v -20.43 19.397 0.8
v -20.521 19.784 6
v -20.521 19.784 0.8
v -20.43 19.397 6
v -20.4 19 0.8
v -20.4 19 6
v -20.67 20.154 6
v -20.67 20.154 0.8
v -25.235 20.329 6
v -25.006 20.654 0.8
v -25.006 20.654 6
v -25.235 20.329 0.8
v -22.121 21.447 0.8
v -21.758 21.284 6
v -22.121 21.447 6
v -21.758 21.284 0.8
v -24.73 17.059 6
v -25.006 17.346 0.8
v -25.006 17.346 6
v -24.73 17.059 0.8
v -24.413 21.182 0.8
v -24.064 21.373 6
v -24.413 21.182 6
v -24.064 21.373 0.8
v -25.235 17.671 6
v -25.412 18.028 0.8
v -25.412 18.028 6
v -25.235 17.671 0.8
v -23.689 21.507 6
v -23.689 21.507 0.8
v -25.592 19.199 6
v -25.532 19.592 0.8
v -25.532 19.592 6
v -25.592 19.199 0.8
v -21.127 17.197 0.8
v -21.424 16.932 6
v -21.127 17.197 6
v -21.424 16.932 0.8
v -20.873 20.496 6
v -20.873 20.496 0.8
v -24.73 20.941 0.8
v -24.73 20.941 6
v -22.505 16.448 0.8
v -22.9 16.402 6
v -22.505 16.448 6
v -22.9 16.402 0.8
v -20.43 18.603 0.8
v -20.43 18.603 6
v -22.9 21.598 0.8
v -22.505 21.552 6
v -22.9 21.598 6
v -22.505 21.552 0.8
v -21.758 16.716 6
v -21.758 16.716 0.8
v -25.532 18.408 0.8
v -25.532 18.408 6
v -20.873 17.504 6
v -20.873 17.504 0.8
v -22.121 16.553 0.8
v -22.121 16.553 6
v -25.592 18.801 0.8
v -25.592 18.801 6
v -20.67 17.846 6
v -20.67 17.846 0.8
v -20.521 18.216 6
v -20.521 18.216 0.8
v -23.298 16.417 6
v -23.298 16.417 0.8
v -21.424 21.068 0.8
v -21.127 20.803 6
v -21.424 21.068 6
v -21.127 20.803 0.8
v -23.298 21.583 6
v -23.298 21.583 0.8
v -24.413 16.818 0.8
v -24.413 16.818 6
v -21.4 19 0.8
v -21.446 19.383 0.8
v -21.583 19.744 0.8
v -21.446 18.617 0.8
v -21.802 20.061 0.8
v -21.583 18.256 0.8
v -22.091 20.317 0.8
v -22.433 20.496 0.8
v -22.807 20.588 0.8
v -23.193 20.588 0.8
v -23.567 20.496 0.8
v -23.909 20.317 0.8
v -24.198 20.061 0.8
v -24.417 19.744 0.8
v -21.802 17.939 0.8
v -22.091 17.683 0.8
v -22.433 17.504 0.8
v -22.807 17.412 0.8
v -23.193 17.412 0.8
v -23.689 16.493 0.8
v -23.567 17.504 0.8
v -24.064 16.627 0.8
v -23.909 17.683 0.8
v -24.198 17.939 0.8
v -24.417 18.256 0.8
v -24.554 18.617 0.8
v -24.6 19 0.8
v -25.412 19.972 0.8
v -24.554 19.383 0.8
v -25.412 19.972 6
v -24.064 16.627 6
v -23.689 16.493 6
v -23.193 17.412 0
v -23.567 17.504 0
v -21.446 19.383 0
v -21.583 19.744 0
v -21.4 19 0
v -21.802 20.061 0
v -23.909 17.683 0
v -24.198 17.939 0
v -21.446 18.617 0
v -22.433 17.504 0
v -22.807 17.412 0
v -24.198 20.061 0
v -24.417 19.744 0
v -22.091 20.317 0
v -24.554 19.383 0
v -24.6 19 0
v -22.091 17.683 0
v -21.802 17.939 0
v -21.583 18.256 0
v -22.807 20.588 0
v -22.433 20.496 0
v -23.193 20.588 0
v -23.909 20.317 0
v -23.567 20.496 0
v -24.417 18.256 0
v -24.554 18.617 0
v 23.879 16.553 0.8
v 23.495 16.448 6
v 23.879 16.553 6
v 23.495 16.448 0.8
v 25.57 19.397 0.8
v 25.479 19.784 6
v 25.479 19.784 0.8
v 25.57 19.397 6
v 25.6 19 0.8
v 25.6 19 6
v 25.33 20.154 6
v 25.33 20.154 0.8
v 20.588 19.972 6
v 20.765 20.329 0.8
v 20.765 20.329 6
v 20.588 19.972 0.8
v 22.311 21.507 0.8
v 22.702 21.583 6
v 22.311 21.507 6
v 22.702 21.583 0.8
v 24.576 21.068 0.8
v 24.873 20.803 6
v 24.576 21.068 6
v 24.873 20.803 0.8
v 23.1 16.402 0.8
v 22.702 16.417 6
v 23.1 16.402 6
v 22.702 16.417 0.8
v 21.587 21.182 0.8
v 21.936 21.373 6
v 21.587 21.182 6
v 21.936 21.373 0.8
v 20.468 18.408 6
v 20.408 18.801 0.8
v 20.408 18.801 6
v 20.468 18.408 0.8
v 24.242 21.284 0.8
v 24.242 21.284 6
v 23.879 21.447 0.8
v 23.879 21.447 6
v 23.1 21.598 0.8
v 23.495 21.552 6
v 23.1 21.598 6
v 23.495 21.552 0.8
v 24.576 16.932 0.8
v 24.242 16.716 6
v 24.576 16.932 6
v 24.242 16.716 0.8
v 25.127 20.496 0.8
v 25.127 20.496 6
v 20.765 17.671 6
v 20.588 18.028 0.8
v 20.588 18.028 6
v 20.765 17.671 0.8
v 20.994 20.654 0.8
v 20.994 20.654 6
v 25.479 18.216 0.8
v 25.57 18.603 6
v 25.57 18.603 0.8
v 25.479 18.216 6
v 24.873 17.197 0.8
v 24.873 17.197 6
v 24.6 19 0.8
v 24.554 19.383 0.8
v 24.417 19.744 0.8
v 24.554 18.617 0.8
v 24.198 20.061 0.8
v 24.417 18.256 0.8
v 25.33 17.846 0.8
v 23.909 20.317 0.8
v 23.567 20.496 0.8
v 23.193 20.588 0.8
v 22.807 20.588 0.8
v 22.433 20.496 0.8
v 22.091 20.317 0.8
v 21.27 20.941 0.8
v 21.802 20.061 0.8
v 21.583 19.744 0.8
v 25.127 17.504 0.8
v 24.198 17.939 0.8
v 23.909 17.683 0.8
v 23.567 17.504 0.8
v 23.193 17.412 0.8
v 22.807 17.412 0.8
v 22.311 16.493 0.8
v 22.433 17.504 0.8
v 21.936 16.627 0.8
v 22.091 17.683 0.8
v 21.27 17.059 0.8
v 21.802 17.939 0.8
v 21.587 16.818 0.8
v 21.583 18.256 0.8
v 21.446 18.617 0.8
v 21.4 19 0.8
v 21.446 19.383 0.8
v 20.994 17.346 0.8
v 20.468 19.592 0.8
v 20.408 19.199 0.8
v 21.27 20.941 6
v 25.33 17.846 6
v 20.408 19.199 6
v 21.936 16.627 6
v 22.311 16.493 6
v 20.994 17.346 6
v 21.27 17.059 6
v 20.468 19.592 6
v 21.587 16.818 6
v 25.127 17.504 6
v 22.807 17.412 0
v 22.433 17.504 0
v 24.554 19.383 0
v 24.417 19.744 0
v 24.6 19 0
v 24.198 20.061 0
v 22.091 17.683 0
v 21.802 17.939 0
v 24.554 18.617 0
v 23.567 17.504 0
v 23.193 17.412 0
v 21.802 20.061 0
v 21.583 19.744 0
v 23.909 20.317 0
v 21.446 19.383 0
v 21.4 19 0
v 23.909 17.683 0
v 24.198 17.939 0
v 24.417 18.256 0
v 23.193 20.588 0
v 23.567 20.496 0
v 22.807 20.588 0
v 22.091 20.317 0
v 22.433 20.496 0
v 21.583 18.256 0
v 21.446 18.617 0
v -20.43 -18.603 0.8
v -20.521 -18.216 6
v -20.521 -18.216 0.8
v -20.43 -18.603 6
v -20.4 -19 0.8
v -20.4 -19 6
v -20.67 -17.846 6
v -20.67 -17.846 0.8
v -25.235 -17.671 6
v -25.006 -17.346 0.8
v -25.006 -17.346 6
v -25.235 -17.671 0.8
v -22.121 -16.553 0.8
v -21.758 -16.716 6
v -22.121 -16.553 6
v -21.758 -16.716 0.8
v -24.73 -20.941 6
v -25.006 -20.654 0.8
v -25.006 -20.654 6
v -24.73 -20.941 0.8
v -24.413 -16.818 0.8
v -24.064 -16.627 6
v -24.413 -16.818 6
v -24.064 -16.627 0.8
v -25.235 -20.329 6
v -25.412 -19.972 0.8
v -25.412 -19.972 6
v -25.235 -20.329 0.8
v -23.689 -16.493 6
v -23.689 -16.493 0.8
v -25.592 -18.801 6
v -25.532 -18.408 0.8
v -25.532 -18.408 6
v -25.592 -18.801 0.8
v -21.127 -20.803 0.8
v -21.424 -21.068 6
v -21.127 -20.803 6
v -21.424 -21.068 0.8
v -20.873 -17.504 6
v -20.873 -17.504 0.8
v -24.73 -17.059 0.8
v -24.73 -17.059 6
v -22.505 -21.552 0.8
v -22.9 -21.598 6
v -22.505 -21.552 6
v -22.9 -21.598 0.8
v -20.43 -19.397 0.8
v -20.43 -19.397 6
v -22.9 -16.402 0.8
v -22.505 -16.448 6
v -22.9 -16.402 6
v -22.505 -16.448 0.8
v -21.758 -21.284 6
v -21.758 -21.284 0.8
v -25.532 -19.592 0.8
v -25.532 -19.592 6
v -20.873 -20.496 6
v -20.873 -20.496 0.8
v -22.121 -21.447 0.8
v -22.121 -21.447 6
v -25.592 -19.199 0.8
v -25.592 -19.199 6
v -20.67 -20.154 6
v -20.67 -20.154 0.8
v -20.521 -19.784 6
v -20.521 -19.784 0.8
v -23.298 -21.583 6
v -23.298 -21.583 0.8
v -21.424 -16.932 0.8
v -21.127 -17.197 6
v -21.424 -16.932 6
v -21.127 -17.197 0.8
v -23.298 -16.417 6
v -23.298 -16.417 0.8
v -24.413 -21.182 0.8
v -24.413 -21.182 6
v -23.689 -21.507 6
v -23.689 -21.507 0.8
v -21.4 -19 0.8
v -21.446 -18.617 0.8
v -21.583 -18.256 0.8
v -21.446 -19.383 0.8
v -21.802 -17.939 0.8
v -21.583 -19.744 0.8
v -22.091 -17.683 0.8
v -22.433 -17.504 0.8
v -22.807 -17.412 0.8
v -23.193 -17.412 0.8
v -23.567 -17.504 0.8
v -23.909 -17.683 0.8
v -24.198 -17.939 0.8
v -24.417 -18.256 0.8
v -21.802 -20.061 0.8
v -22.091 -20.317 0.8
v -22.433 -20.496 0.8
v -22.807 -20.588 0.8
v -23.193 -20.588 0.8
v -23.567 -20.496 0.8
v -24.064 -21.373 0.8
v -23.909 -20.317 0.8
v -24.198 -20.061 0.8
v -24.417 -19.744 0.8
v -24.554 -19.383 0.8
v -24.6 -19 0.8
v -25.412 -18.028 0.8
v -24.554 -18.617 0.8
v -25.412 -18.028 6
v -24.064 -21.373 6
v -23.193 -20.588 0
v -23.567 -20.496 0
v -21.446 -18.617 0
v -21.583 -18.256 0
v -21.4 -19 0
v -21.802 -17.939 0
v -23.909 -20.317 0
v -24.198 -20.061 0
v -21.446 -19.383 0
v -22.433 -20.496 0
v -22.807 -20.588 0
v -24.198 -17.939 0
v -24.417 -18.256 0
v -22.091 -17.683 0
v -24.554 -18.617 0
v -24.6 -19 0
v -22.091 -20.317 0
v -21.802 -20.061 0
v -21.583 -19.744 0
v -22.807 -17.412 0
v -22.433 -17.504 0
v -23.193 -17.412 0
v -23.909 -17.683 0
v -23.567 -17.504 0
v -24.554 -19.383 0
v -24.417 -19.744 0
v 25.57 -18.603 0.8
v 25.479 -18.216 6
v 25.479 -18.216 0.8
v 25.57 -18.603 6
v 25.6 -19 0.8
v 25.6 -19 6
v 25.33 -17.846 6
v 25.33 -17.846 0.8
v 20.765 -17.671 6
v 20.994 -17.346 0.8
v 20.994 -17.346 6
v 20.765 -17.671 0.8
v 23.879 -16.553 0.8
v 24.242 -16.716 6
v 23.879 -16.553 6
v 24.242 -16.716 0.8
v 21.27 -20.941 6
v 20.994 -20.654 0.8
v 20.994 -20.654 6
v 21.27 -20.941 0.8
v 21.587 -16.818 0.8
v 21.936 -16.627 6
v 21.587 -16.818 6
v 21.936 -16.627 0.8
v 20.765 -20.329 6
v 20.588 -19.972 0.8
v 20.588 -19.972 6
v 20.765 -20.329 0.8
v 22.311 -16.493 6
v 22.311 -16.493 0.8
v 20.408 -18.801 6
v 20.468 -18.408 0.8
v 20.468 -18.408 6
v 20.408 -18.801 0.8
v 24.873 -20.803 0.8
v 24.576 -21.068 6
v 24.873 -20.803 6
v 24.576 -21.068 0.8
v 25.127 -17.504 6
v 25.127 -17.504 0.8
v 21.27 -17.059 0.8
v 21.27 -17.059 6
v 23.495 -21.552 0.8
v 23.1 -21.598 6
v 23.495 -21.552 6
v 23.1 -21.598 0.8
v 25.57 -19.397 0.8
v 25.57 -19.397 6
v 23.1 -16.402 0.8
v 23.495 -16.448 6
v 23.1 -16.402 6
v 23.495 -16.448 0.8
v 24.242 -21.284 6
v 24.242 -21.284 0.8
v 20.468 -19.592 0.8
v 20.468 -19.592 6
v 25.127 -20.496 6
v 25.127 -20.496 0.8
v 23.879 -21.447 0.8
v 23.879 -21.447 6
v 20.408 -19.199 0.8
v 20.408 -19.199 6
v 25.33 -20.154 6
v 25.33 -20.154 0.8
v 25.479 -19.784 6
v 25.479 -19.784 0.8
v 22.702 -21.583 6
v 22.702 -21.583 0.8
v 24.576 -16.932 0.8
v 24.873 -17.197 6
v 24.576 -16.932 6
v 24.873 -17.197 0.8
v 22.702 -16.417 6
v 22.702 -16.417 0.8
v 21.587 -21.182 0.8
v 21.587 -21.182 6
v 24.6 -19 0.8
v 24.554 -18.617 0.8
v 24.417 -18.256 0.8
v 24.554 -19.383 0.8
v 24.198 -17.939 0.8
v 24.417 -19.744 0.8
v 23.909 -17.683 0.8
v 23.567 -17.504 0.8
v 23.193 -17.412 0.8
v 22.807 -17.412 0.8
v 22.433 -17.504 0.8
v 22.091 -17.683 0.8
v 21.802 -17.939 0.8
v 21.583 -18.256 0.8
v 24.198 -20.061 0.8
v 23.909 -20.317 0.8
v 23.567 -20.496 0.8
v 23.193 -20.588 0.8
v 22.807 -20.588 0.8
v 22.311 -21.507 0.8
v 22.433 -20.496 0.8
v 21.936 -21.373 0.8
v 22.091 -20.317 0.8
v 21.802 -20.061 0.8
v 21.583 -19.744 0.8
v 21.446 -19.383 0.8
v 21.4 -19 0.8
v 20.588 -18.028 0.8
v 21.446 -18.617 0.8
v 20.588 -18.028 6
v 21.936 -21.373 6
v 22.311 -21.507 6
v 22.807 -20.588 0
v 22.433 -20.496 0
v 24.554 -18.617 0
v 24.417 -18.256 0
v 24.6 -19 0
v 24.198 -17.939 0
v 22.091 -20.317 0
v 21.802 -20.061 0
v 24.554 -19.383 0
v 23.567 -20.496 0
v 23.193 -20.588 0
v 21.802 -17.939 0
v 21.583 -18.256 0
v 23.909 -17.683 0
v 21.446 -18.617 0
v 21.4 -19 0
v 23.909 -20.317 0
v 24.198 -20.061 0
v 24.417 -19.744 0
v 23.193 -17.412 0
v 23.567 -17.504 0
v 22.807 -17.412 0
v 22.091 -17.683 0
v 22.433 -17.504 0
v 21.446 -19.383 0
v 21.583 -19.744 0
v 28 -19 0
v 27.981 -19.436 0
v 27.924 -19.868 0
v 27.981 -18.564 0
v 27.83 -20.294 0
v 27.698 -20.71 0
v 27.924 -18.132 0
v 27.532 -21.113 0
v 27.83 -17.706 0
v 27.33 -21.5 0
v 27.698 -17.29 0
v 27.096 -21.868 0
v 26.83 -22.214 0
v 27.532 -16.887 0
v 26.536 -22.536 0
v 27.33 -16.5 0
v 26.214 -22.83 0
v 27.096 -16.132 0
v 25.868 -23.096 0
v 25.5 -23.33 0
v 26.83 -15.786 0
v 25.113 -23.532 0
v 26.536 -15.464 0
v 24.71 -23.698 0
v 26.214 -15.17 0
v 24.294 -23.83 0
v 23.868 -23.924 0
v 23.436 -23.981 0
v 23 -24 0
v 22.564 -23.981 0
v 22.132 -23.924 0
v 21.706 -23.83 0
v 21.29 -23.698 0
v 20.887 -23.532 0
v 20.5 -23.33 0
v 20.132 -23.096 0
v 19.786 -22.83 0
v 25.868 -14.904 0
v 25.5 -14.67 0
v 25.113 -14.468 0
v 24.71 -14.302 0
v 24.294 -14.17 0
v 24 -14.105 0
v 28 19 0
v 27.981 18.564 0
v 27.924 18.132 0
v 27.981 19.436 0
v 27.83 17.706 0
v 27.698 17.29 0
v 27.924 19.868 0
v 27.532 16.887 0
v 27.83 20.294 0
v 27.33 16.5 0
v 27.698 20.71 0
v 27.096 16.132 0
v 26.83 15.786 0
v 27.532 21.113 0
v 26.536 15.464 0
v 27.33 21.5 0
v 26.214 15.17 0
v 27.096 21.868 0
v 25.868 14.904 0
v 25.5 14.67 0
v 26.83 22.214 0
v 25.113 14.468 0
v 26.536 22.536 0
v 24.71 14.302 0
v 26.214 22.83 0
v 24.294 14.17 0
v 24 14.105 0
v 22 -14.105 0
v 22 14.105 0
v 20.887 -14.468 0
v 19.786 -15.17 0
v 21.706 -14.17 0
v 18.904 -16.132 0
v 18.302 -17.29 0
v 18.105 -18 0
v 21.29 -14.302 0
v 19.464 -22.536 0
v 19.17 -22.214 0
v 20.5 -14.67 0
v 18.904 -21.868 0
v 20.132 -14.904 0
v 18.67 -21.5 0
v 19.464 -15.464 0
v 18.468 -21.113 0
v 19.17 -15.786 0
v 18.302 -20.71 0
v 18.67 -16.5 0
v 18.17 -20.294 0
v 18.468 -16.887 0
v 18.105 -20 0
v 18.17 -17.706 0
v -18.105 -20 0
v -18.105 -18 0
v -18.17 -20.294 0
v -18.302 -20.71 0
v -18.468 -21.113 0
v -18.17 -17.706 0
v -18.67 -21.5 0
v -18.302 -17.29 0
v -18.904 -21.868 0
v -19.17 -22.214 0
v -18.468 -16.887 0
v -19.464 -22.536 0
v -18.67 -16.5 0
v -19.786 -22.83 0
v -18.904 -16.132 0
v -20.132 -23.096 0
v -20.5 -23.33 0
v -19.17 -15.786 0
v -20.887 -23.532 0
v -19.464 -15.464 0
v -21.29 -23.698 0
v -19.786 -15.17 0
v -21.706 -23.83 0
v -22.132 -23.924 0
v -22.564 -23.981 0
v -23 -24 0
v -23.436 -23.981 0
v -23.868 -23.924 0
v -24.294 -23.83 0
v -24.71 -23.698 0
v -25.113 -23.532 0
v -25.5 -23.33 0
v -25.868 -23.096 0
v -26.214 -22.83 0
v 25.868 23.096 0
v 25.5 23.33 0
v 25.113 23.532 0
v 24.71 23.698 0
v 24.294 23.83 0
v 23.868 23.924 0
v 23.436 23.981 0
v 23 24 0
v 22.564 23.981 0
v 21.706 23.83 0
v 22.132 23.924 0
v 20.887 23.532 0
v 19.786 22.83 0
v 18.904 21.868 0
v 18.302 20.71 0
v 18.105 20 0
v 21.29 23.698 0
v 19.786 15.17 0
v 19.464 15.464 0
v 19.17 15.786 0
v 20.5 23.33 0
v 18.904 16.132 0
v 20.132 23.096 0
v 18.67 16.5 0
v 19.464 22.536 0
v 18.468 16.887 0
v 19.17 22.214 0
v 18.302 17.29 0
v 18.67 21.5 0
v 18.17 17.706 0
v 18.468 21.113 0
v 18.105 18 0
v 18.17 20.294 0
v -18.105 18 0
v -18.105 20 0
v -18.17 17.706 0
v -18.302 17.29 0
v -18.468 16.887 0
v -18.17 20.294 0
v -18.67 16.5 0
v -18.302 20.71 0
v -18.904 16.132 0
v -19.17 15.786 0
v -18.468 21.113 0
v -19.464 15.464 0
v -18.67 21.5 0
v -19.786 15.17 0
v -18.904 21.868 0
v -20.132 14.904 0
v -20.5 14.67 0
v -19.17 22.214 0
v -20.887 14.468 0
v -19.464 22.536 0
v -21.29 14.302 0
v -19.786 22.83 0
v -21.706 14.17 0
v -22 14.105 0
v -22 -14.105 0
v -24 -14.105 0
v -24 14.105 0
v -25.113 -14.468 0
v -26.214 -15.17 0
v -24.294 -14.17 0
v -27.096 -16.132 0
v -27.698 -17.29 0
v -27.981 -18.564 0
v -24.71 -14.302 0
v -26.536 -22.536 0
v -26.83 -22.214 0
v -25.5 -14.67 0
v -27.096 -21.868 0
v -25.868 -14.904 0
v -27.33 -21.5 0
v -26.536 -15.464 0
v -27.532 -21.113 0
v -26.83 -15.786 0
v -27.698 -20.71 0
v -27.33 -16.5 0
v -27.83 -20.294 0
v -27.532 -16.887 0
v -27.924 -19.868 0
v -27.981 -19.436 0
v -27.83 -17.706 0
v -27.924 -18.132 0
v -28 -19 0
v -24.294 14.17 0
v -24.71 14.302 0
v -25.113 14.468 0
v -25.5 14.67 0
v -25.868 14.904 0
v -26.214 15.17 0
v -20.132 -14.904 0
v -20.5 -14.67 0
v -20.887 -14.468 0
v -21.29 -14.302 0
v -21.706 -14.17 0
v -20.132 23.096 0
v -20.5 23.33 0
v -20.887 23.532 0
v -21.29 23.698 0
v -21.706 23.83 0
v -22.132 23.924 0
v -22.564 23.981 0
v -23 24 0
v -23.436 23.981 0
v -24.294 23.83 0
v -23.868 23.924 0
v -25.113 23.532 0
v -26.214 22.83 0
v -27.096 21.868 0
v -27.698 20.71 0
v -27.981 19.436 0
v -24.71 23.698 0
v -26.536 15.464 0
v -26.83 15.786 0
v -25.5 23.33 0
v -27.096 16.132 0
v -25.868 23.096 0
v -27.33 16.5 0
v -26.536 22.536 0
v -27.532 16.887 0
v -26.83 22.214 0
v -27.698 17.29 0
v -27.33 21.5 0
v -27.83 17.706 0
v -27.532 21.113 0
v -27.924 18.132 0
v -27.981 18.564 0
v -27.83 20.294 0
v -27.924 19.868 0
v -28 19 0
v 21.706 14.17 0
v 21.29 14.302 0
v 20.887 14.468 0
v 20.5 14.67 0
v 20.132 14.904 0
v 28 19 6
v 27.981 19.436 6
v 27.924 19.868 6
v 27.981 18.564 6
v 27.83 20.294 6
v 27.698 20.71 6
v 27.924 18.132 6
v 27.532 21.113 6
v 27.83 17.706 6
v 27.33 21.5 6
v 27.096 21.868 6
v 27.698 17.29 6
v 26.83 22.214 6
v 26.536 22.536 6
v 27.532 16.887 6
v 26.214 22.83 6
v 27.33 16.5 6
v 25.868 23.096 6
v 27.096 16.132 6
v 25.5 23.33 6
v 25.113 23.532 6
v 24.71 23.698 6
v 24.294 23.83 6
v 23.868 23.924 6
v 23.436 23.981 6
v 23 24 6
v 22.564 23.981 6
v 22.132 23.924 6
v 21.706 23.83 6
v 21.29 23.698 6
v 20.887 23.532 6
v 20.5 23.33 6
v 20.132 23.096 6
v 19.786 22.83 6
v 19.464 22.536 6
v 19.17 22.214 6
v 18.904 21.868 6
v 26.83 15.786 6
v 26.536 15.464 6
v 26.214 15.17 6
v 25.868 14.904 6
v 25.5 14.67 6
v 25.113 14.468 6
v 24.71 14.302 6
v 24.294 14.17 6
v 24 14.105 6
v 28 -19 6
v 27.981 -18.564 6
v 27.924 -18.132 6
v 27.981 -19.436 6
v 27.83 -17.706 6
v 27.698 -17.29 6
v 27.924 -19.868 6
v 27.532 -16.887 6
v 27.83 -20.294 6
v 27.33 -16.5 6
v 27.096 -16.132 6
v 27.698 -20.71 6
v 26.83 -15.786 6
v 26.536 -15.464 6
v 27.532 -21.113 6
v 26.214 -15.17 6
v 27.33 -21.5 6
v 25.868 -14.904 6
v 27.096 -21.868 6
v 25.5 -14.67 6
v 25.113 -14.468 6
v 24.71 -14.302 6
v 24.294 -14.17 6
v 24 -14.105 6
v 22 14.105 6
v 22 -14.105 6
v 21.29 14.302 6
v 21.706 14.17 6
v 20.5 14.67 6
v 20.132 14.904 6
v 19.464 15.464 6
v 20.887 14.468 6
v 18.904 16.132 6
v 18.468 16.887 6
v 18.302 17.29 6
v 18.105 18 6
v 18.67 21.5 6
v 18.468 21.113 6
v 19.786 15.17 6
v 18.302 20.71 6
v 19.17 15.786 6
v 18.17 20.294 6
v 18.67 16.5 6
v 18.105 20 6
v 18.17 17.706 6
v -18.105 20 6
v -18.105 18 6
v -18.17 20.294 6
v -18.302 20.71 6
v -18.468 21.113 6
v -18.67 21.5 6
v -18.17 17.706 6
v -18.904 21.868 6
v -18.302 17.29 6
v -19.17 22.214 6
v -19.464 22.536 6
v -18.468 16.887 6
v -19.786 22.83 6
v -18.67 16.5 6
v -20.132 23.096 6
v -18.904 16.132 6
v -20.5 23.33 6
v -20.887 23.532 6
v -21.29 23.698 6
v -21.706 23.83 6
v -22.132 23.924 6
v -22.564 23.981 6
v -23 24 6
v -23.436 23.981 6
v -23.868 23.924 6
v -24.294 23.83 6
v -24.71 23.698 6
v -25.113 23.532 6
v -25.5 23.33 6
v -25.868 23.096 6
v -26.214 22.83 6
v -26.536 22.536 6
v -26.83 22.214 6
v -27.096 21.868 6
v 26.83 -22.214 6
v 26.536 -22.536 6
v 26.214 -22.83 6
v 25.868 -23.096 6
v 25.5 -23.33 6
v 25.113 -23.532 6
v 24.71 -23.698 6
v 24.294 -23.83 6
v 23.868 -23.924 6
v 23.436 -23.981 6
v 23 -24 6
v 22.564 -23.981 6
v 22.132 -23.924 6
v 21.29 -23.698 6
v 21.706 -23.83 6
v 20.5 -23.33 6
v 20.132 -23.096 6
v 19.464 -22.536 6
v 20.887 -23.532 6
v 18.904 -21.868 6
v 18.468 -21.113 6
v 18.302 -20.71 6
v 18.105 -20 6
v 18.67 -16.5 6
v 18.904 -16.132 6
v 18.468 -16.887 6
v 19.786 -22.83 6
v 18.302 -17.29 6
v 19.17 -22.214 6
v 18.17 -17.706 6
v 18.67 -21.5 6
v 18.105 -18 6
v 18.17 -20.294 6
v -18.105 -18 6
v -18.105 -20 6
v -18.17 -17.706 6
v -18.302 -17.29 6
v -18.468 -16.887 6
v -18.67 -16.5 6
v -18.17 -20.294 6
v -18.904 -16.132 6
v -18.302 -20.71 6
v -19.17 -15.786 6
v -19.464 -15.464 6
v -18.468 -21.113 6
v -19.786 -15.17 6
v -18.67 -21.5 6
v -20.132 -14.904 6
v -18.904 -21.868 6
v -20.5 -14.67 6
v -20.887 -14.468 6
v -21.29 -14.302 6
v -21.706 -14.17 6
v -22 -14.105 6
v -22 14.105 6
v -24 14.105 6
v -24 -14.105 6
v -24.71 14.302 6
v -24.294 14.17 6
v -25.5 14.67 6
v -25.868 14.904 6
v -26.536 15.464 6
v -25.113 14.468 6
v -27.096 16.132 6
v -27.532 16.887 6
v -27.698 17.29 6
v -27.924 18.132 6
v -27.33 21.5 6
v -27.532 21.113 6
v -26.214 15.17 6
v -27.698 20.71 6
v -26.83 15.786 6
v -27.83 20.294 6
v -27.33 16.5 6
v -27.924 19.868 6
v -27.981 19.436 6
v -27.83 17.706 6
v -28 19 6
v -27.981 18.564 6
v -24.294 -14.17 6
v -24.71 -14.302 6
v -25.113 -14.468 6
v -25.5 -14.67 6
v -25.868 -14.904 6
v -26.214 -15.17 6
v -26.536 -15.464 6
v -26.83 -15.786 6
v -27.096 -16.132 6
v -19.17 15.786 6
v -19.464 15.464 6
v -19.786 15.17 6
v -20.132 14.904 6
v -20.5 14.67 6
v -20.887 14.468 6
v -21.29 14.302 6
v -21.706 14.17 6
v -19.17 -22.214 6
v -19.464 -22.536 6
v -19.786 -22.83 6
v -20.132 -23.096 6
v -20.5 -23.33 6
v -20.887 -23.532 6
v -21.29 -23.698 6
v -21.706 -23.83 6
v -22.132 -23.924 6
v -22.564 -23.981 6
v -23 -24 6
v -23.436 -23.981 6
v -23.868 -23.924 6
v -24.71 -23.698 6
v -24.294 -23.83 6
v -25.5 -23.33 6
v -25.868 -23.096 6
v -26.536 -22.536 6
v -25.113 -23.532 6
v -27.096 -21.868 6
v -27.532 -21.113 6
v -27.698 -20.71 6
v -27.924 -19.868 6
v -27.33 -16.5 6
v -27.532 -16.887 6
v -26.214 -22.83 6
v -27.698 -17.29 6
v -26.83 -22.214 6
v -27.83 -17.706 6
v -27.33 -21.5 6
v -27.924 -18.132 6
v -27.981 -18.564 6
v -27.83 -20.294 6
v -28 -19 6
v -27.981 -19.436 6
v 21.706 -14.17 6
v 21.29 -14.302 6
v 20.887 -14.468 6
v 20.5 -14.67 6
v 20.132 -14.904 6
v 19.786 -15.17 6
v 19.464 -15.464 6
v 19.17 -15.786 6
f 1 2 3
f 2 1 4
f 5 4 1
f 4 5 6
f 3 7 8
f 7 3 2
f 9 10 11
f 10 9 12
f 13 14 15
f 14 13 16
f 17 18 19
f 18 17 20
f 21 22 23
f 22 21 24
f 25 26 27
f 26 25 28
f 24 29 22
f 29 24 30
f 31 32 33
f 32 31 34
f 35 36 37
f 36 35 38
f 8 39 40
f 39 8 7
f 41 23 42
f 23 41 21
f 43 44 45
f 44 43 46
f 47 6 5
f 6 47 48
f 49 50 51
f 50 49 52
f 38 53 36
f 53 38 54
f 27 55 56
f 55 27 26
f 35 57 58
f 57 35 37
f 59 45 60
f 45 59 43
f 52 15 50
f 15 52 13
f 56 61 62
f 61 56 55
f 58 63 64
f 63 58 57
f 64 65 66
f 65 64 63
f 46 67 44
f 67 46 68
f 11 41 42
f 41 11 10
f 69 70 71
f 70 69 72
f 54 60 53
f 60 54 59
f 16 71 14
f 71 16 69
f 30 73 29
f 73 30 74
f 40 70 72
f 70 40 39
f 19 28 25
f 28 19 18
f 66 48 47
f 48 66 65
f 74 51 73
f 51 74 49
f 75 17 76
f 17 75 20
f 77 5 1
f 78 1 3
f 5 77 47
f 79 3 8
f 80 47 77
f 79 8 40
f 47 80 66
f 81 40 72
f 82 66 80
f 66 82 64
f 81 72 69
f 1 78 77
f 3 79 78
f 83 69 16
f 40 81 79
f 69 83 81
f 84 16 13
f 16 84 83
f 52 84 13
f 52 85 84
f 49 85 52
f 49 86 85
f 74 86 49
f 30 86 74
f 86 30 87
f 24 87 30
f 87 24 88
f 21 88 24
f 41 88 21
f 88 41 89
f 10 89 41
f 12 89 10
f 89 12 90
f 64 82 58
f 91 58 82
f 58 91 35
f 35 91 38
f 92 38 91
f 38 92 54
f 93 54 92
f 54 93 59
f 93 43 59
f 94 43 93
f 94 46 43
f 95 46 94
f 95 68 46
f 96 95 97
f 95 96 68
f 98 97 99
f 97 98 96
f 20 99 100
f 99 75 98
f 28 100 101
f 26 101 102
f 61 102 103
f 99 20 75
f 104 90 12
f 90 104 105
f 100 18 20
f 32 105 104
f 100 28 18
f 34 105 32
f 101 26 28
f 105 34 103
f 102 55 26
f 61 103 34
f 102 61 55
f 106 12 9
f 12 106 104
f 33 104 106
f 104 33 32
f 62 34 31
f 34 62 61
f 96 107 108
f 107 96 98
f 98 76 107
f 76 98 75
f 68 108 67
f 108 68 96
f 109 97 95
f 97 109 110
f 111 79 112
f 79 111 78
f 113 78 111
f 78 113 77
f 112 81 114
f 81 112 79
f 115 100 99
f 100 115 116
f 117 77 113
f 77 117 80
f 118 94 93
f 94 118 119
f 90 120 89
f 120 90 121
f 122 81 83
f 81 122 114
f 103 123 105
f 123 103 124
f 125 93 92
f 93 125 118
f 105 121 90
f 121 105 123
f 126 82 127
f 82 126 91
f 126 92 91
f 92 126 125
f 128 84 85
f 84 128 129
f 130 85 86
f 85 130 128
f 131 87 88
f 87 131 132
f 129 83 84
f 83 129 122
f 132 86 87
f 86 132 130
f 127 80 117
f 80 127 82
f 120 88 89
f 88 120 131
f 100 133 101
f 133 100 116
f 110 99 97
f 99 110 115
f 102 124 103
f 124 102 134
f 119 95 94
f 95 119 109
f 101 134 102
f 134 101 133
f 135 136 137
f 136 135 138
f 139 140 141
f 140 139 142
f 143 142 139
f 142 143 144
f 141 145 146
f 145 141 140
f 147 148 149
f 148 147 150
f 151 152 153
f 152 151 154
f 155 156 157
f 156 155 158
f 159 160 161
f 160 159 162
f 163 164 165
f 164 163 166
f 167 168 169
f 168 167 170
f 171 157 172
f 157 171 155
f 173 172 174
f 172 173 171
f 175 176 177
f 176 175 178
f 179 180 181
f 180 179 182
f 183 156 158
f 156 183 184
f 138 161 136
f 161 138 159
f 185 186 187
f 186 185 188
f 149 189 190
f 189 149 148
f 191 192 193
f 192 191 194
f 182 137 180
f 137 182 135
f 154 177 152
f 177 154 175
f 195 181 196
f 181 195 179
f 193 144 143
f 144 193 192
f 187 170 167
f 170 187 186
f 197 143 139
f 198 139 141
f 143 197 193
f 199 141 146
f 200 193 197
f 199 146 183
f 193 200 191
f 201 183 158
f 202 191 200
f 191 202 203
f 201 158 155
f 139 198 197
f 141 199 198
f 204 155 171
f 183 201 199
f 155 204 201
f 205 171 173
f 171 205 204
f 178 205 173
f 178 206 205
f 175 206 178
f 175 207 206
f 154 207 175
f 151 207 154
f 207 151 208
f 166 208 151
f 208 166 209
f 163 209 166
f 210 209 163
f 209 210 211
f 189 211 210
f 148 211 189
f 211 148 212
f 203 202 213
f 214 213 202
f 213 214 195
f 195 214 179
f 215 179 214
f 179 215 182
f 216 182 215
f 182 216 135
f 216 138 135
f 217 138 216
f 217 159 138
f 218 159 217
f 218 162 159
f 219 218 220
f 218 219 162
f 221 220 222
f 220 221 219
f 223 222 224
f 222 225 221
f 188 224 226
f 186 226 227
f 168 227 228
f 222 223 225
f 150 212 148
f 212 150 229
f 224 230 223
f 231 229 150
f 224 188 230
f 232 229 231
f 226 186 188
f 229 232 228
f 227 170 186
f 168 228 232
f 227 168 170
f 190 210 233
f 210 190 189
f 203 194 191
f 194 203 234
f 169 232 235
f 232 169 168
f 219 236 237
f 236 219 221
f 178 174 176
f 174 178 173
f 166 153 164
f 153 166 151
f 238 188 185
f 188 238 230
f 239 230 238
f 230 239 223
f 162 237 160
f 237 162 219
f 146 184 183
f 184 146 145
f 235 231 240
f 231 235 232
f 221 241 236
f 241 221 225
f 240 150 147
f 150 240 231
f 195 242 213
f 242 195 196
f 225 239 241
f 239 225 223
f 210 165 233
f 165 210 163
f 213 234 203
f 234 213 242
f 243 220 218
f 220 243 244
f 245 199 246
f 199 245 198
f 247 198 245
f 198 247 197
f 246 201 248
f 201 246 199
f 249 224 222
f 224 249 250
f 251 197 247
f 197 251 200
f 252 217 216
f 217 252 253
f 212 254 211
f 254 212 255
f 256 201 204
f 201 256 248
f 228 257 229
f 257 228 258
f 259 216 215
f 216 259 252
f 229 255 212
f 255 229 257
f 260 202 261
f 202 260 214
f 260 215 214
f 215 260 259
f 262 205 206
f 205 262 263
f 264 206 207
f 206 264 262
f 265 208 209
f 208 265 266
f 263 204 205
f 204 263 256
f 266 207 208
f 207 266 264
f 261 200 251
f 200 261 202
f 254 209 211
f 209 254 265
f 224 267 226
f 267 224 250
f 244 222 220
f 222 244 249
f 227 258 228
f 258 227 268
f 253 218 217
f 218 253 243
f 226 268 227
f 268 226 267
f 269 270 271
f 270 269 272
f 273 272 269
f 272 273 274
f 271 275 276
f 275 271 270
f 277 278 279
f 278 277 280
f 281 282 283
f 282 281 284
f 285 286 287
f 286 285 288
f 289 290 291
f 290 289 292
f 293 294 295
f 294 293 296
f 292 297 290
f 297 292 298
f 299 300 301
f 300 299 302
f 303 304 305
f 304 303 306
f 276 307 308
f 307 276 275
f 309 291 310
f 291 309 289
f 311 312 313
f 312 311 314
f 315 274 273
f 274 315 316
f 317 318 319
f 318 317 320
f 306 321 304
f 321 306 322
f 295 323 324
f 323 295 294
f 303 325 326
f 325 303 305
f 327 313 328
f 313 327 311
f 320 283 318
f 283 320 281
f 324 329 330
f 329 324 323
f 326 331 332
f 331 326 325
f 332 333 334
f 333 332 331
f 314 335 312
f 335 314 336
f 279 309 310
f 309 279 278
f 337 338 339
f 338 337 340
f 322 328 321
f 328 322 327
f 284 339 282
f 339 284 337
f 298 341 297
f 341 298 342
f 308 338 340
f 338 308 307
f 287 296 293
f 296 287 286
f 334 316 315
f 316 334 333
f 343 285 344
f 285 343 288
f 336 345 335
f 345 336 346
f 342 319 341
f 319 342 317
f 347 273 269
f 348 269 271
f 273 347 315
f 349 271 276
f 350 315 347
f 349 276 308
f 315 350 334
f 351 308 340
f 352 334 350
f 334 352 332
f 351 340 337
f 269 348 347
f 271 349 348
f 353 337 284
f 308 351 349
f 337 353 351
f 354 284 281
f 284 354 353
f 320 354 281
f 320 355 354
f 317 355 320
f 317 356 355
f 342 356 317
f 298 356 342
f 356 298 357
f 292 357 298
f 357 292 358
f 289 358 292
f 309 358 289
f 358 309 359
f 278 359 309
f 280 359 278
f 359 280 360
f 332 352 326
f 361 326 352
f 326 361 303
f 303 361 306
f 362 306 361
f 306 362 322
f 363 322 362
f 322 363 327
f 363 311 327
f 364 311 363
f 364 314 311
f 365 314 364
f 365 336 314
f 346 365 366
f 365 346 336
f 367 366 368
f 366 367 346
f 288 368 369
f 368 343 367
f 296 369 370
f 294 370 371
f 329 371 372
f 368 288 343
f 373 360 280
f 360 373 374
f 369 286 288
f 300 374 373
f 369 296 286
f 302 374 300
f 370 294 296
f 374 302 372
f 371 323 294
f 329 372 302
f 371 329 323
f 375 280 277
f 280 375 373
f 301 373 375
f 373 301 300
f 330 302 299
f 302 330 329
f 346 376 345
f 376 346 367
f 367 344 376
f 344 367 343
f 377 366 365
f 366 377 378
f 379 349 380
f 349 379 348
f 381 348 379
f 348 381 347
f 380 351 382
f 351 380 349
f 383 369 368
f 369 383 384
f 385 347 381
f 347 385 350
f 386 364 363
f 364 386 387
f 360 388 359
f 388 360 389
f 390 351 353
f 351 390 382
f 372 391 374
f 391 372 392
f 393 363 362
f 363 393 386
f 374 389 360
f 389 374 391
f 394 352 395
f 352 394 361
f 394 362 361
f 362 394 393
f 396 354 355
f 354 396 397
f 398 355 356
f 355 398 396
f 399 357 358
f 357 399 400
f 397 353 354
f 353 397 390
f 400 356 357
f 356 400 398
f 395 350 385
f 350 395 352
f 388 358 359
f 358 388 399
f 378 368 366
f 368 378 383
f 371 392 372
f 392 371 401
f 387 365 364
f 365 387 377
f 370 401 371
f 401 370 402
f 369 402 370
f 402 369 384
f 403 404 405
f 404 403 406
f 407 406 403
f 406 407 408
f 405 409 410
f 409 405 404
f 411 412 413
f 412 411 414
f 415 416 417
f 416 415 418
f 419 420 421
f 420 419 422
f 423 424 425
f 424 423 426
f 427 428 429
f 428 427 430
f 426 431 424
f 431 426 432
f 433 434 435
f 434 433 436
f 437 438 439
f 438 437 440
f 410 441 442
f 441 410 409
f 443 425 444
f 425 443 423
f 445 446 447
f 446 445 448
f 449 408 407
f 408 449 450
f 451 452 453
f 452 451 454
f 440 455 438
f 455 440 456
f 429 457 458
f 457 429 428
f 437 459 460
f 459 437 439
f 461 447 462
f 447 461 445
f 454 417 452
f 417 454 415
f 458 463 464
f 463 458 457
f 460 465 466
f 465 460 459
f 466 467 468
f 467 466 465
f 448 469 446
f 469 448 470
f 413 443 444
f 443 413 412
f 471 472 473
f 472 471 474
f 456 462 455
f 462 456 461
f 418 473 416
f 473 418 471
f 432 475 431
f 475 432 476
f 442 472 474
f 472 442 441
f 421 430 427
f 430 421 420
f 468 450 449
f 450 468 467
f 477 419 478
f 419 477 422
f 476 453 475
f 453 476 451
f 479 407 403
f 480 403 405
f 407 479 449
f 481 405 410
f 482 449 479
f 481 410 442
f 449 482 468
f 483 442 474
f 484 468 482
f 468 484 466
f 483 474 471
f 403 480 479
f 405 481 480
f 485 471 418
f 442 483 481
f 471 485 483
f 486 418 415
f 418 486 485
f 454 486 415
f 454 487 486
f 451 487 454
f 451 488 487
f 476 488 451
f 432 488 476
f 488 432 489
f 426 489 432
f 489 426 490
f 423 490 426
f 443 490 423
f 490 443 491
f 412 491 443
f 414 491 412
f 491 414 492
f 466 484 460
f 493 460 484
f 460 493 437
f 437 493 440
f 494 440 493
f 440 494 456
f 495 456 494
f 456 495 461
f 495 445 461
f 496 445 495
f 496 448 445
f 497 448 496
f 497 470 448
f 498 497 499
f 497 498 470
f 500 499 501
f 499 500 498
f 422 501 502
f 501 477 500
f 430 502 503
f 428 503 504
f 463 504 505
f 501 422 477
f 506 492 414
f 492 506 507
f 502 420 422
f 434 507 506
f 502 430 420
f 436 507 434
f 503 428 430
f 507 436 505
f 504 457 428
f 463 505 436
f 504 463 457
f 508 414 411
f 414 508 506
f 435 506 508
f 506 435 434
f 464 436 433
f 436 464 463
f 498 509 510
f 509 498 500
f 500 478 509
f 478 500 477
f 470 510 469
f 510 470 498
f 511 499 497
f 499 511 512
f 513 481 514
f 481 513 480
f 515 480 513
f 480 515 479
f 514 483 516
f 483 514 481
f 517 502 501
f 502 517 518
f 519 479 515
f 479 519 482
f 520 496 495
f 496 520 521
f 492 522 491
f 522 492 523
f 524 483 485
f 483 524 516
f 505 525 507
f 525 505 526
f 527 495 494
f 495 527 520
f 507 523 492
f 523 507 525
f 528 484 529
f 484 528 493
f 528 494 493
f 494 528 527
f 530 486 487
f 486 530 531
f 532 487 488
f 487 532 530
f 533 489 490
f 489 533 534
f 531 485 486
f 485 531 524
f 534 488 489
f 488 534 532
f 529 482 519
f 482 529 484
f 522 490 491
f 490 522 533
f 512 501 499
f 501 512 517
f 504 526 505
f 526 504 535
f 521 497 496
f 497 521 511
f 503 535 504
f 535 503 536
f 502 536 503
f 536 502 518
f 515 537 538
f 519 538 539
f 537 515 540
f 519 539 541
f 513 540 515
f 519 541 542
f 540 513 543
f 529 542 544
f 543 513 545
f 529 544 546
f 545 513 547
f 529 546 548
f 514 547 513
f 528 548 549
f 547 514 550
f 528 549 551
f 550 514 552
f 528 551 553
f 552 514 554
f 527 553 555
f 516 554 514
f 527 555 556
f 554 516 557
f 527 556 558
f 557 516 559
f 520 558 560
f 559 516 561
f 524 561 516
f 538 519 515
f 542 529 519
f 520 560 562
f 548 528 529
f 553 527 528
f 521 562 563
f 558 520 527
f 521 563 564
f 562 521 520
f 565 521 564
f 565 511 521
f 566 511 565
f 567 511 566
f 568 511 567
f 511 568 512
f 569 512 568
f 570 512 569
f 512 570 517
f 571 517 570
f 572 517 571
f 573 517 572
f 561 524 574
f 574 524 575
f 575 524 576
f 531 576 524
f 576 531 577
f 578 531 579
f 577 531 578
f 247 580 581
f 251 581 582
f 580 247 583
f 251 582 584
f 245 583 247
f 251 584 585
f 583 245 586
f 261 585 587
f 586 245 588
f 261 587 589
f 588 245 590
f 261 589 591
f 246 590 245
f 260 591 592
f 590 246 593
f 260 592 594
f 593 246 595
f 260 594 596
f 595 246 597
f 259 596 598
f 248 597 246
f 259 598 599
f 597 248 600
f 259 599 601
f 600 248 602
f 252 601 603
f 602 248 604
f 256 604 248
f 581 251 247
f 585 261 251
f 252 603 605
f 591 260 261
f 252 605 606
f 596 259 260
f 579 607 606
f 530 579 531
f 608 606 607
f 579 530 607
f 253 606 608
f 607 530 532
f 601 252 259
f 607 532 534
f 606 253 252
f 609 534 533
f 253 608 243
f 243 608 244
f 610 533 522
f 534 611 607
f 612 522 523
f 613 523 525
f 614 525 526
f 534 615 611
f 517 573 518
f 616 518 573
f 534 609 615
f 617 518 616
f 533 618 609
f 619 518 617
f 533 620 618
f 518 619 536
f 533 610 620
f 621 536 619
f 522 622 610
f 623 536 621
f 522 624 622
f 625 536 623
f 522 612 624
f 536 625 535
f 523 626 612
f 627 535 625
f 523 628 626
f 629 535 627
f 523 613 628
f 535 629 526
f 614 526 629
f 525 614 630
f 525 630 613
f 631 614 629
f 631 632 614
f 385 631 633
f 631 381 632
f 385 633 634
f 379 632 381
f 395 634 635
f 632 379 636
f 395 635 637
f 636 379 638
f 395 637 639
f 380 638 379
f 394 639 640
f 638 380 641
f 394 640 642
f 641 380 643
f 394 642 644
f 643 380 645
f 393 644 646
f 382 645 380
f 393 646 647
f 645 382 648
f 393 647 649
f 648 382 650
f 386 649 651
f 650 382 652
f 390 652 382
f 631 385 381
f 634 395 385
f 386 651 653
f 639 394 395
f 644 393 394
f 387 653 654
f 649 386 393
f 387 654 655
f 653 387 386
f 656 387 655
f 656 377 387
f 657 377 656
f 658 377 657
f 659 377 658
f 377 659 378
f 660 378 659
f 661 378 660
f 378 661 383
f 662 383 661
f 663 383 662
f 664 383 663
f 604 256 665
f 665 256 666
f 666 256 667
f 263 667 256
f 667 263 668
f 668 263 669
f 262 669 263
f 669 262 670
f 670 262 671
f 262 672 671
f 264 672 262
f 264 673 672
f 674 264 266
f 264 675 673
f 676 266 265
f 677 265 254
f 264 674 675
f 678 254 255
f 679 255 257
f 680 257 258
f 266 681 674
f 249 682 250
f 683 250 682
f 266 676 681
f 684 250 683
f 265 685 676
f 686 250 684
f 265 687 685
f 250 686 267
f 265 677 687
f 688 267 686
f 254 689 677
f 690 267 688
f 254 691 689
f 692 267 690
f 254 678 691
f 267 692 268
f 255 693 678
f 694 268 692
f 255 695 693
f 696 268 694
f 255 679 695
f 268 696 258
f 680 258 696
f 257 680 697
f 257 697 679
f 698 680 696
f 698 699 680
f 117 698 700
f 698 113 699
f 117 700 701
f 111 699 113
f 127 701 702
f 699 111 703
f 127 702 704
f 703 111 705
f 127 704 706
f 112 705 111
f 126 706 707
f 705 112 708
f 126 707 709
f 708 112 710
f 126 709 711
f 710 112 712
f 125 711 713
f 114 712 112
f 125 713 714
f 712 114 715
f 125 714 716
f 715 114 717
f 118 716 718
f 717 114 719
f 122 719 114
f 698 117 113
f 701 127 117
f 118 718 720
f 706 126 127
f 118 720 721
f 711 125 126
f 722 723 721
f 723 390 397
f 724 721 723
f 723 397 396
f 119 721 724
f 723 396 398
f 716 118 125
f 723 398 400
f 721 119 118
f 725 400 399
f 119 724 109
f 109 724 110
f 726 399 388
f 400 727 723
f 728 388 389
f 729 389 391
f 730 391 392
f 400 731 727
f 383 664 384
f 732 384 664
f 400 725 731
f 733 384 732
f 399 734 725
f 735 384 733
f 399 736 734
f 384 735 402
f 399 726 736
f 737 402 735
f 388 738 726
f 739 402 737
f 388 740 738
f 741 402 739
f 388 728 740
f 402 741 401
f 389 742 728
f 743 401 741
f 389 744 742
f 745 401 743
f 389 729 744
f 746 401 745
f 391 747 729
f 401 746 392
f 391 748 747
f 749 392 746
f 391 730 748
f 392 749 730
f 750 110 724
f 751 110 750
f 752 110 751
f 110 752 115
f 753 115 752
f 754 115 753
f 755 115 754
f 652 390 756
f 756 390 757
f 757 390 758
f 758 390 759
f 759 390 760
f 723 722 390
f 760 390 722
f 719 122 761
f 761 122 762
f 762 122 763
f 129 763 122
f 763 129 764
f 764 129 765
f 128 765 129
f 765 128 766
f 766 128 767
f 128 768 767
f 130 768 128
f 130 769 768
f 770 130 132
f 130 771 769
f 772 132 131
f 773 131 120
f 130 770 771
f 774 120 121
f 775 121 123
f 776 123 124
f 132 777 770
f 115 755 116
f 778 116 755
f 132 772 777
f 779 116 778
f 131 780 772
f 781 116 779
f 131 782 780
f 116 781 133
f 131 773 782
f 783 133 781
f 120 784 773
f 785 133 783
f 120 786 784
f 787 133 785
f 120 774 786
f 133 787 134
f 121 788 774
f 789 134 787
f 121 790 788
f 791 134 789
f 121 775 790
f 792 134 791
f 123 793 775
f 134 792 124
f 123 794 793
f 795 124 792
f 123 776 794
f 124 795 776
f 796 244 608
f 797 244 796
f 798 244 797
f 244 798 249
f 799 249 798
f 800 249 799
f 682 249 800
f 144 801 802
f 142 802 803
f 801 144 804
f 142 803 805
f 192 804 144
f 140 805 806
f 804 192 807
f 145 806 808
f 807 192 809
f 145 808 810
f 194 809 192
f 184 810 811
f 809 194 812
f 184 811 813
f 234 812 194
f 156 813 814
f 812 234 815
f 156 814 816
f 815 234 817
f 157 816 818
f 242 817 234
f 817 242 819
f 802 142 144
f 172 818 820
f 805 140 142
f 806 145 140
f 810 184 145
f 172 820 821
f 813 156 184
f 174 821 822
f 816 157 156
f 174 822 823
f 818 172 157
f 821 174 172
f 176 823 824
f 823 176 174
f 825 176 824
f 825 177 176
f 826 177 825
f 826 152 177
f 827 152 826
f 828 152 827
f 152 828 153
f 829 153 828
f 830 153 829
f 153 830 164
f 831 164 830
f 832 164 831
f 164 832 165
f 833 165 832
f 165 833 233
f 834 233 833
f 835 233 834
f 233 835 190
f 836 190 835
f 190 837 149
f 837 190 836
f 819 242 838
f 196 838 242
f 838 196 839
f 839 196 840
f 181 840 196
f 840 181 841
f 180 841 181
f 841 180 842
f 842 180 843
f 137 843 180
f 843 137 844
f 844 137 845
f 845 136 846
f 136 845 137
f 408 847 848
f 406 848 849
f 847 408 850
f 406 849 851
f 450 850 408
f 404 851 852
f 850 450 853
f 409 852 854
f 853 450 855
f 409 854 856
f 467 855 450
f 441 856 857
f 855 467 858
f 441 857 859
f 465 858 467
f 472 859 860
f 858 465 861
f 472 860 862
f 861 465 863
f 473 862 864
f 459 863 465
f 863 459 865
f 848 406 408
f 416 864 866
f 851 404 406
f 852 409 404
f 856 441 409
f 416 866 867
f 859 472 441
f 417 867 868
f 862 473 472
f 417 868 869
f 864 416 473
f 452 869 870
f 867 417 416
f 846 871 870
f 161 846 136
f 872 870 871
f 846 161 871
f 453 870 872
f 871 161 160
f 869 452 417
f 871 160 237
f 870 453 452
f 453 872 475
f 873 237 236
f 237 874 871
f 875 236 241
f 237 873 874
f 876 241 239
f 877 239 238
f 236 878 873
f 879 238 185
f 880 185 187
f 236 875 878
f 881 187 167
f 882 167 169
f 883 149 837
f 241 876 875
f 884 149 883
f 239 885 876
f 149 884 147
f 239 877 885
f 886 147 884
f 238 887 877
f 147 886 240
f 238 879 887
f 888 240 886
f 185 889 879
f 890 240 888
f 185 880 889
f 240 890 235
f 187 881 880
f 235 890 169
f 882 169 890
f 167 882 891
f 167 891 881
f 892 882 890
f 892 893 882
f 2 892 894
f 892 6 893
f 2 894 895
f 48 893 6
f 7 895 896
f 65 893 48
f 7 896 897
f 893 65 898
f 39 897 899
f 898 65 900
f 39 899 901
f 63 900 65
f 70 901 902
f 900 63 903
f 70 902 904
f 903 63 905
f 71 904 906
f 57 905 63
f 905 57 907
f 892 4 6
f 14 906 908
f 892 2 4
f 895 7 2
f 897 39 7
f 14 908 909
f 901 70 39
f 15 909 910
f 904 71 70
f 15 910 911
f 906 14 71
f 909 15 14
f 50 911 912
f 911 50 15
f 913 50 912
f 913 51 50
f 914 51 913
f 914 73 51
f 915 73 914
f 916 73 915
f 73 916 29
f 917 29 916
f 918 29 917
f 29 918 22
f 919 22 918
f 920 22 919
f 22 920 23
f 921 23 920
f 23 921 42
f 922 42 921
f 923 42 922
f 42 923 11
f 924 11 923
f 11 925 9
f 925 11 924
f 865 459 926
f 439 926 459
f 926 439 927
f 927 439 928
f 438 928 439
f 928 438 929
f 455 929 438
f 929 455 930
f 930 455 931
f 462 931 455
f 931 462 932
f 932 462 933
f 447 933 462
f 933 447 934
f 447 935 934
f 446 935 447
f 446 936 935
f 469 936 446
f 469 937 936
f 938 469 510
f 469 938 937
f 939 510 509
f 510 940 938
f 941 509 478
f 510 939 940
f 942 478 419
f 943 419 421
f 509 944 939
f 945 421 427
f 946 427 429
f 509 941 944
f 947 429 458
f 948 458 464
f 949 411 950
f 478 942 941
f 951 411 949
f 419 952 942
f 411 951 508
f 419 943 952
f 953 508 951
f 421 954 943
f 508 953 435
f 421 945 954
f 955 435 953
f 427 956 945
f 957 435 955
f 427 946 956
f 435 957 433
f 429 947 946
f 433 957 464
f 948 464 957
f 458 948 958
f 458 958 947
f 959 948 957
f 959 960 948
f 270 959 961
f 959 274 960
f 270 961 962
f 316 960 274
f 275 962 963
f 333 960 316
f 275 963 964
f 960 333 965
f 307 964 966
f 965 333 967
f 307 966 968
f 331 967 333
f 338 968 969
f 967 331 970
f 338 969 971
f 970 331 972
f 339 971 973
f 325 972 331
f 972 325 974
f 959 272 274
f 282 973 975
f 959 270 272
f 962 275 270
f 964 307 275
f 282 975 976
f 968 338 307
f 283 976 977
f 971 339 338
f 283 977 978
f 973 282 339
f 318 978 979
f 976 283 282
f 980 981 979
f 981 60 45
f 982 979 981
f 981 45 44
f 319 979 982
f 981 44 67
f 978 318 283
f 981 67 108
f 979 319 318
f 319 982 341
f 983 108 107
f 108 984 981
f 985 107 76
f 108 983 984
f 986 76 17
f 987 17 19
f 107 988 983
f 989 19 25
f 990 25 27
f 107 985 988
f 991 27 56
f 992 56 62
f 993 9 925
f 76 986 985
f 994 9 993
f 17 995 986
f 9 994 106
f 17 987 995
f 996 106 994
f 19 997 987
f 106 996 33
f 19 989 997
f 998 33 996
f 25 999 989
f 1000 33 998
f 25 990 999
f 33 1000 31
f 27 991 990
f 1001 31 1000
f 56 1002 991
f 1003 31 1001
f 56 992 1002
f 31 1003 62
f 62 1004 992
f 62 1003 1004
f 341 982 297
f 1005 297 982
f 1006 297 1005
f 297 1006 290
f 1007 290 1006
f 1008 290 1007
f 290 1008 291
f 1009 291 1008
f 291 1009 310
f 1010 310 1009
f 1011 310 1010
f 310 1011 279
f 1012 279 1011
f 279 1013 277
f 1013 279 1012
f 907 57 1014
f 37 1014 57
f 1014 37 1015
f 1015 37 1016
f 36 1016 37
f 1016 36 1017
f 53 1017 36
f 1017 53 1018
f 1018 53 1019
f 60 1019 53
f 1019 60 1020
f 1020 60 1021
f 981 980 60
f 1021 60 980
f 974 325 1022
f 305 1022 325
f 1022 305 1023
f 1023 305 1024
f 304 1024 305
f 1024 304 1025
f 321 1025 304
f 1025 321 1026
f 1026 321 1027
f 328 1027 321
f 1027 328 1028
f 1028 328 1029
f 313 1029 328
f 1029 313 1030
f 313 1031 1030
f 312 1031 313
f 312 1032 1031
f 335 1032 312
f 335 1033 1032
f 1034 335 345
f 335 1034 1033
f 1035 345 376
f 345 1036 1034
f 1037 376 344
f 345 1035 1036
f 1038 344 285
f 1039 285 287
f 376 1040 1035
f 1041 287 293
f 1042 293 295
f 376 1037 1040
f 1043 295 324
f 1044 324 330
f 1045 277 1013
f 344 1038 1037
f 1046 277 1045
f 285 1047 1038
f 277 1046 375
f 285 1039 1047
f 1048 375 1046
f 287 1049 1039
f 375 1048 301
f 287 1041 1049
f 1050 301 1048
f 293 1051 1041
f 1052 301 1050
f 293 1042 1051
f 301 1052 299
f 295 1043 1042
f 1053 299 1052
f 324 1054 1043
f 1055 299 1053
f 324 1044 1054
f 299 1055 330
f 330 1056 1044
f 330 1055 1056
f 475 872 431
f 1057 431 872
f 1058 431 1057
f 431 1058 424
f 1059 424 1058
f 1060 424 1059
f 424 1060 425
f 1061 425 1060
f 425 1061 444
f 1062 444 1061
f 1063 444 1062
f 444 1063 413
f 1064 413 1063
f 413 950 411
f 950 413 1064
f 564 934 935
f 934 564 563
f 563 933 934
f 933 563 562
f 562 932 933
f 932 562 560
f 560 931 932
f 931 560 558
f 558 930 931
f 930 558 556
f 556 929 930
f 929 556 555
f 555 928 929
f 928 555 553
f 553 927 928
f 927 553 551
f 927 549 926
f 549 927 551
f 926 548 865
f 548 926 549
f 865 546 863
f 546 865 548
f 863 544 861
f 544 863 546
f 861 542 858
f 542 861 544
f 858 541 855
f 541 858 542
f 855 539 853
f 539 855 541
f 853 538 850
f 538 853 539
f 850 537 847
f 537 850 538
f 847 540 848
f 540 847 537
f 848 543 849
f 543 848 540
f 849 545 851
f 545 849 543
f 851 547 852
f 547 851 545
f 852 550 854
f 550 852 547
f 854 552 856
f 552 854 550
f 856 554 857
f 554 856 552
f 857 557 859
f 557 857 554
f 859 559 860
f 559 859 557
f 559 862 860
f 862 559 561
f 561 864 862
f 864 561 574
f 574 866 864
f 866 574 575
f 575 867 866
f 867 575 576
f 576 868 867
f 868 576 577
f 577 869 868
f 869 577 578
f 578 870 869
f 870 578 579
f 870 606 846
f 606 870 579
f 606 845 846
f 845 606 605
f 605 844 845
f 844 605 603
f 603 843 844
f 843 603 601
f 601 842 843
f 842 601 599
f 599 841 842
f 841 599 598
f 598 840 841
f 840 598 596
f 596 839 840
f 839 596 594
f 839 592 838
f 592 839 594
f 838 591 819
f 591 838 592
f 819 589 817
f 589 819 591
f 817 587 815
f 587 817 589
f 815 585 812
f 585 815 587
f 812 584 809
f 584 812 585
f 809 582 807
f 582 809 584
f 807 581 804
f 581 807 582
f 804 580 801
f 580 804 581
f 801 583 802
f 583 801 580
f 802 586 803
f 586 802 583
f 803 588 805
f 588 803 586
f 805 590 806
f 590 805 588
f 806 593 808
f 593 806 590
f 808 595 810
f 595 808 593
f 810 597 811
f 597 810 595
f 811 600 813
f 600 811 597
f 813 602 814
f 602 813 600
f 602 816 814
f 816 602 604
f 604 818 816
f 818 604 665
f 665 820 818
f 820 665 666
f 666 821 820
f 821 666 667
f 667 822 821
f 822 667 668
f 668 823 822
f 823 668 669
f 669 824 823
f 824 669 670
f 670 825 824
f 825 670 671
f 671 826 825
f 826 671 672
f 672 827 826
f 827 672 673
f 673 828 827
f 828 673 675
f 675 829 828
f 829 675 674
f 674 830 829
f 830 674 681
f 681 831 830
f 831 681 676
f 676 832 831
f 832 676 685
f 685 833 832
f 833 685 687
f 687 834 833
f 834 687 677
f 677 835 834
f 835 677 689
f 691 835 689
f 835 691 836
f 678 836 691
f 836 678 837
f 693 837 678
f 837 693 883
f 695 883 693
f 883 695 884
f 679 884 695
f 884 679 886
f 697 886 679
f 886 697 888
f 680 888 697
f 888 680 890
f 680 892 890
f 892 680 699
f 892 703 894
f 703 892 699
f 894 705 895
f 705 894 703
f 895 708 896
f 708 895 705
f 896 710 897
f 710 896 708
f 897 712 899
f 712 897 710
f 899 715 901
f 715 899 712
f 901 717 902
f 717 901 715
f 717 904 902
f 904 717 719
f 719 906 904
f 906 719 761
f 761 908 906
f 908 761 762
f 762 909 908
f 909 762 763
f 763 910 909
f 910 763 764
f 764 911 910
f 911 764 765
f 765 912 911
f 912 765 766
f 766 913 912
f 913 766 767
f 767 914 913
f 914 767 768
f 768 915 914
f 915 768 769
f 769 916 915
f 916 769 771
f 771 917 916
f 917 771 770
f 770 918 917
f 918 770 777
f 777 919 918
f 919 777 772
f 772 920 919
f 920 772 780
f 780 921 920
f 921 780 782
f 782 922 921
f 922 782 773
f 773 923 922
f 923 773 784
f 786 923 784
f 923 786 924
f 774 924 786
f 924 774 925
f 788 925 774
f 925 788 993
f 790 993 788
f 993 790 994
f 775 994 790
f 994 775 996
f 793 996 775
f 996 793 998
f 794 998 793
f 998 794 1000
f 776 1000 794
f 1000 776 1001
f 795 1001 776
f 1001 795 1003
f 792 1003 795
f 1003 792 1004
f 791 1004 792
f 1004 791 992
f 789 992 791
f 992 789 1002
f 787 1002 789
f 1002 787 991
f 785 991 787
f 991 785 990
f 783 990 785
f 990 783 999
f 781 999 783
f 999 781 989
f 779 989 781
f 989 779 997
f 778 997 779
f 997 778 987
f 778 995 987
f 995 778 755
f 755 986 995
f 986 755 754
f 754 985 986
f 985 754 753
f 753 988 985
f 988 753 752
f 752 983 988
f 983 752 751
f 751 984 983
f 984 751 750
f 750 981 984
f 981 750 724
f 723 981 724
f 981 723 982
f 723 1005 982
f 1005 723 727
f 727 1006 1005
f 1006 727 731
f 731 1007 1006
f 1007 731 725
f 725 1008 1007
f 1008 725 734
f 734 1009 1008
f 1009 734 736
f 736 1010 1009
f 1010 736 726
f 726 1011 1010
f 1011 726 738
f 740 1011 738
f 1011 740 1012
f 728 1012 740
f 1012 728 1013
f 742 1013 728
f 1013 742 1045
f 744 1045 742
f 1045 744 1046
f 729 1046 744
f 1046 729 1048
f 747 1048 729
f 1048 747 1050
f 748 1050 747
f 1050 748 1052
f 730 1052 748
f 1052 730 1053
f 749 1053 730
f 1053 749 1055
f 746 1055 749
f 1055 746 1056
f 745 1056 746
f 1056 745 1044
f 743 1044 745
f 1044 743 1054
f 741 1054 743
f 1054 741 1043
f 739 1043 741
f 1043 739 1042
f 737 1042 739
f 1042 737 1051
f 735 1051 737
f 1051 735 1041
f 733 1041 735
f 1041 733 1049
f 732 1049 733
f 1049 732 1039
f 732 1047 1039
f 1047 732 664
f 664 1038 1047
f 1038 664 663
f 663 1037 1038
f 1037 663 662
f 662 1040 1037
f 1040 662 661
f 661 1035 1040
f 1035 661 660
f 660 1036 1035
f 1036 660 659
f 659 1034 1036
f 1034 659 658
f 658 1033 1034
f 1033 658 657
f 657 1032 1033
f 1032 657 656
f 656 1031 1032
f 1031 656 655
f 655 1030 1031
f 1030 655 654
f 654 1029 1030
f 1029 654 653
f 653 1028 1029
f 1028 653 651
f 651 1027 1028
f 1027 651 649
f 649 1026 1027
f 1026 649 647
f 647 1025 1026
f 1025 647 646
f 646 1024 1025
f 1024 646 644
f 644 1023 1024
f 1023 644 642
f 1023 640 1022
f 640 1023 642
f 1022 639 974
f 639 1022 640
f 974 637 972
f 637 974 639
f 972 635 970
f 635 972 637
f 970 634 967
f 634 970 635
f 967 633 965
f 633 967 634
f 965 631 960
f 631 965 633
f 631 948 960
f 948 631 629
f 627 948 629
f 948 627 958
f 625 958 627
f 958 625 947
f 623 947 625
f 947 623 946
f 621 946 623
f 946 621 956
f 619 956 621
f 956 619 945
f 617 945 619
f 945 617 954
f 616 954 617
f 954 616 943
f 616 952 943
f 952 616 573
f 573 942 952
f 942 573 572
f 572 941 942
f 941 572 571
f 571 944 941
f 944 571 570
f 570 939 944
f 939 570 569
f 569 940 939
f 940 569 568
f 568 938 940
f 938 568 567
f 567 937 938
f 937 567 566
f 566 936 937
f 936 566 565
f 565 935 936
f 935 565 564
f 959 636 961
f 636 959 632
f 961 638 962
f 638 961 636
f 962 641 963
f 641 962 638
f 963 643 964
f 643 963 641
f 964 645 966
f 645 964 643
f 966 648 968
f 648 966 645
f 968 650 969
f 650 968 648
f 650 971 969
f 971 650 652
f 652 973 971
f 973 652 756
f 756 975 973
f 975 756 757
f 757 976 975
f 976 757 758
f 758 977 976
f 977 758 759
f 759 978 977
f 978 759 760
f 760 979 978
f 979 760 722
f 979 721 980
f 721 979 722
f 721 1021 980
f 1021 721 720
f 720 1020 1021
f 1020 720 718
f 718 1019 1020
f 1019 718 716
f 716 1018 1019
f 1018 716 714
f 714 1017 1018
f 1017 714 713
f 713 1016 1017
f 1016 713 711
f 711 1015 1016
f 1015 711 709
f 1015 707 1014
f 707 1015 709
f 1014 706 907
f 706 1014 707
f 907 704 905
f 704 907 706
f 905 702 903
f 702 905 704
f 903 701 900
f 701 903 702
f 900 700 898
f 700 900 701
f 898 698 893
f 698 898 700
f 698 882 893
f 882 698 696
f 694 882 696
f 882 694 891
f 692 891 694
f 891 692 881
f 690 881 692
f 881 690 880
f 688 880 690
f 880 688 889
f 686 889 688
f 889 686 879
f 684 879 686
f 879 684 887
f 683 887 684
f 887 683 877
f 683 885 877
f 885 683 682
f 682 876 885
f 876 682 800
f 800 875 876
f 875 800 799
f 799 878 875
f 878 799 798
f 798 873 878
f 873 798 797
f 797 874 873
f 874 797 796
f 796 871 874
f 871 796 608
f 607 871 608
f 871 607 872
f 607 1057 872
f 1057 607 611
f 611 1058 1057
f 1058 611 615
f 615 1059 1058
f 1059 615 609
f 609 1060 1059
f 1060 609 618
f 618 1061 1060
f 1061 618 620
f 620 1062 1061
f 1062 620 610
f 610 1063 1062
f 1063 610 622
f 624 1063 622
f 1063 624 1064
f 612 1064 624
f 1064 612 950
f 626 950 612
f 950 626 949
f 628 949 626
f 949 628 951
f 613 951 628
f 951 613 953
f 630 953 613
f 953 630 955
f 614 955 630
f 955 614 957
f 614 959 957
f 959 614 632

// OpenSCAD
//$fn=60;
$fa=5;
$fs=.4;

holeA = [-23,19,0];
holeB = [23,19,0];
holeC = [-23,-19,0];
holeD = [23,-19,0];

difference(){
    base_shape();
    insert_hole(holeA);
    insert_hole(holeB);
    insert_hole(holeC);
    insert_hole(holeD);
}



module insert_hole(place){
    translate([place[0],place[1],0]){
        translate([0,0,0.8]) cylinder(h=6,d=5.2);
        translate([0,0,-0.8]) cylinder(h=6,d=3.2);
    }
}


module base_shape(){
    linear_extrude(height=6){
        translate(holeA) circle(d=10);
        translate(holeB) circle(d=10);
        translate(holeC) circle(d=10);
        translate(holeD) circle(d=10);
        difference(){
            square([48,40],center=true);
            square([44,36],center=true);
        }
    }
}
